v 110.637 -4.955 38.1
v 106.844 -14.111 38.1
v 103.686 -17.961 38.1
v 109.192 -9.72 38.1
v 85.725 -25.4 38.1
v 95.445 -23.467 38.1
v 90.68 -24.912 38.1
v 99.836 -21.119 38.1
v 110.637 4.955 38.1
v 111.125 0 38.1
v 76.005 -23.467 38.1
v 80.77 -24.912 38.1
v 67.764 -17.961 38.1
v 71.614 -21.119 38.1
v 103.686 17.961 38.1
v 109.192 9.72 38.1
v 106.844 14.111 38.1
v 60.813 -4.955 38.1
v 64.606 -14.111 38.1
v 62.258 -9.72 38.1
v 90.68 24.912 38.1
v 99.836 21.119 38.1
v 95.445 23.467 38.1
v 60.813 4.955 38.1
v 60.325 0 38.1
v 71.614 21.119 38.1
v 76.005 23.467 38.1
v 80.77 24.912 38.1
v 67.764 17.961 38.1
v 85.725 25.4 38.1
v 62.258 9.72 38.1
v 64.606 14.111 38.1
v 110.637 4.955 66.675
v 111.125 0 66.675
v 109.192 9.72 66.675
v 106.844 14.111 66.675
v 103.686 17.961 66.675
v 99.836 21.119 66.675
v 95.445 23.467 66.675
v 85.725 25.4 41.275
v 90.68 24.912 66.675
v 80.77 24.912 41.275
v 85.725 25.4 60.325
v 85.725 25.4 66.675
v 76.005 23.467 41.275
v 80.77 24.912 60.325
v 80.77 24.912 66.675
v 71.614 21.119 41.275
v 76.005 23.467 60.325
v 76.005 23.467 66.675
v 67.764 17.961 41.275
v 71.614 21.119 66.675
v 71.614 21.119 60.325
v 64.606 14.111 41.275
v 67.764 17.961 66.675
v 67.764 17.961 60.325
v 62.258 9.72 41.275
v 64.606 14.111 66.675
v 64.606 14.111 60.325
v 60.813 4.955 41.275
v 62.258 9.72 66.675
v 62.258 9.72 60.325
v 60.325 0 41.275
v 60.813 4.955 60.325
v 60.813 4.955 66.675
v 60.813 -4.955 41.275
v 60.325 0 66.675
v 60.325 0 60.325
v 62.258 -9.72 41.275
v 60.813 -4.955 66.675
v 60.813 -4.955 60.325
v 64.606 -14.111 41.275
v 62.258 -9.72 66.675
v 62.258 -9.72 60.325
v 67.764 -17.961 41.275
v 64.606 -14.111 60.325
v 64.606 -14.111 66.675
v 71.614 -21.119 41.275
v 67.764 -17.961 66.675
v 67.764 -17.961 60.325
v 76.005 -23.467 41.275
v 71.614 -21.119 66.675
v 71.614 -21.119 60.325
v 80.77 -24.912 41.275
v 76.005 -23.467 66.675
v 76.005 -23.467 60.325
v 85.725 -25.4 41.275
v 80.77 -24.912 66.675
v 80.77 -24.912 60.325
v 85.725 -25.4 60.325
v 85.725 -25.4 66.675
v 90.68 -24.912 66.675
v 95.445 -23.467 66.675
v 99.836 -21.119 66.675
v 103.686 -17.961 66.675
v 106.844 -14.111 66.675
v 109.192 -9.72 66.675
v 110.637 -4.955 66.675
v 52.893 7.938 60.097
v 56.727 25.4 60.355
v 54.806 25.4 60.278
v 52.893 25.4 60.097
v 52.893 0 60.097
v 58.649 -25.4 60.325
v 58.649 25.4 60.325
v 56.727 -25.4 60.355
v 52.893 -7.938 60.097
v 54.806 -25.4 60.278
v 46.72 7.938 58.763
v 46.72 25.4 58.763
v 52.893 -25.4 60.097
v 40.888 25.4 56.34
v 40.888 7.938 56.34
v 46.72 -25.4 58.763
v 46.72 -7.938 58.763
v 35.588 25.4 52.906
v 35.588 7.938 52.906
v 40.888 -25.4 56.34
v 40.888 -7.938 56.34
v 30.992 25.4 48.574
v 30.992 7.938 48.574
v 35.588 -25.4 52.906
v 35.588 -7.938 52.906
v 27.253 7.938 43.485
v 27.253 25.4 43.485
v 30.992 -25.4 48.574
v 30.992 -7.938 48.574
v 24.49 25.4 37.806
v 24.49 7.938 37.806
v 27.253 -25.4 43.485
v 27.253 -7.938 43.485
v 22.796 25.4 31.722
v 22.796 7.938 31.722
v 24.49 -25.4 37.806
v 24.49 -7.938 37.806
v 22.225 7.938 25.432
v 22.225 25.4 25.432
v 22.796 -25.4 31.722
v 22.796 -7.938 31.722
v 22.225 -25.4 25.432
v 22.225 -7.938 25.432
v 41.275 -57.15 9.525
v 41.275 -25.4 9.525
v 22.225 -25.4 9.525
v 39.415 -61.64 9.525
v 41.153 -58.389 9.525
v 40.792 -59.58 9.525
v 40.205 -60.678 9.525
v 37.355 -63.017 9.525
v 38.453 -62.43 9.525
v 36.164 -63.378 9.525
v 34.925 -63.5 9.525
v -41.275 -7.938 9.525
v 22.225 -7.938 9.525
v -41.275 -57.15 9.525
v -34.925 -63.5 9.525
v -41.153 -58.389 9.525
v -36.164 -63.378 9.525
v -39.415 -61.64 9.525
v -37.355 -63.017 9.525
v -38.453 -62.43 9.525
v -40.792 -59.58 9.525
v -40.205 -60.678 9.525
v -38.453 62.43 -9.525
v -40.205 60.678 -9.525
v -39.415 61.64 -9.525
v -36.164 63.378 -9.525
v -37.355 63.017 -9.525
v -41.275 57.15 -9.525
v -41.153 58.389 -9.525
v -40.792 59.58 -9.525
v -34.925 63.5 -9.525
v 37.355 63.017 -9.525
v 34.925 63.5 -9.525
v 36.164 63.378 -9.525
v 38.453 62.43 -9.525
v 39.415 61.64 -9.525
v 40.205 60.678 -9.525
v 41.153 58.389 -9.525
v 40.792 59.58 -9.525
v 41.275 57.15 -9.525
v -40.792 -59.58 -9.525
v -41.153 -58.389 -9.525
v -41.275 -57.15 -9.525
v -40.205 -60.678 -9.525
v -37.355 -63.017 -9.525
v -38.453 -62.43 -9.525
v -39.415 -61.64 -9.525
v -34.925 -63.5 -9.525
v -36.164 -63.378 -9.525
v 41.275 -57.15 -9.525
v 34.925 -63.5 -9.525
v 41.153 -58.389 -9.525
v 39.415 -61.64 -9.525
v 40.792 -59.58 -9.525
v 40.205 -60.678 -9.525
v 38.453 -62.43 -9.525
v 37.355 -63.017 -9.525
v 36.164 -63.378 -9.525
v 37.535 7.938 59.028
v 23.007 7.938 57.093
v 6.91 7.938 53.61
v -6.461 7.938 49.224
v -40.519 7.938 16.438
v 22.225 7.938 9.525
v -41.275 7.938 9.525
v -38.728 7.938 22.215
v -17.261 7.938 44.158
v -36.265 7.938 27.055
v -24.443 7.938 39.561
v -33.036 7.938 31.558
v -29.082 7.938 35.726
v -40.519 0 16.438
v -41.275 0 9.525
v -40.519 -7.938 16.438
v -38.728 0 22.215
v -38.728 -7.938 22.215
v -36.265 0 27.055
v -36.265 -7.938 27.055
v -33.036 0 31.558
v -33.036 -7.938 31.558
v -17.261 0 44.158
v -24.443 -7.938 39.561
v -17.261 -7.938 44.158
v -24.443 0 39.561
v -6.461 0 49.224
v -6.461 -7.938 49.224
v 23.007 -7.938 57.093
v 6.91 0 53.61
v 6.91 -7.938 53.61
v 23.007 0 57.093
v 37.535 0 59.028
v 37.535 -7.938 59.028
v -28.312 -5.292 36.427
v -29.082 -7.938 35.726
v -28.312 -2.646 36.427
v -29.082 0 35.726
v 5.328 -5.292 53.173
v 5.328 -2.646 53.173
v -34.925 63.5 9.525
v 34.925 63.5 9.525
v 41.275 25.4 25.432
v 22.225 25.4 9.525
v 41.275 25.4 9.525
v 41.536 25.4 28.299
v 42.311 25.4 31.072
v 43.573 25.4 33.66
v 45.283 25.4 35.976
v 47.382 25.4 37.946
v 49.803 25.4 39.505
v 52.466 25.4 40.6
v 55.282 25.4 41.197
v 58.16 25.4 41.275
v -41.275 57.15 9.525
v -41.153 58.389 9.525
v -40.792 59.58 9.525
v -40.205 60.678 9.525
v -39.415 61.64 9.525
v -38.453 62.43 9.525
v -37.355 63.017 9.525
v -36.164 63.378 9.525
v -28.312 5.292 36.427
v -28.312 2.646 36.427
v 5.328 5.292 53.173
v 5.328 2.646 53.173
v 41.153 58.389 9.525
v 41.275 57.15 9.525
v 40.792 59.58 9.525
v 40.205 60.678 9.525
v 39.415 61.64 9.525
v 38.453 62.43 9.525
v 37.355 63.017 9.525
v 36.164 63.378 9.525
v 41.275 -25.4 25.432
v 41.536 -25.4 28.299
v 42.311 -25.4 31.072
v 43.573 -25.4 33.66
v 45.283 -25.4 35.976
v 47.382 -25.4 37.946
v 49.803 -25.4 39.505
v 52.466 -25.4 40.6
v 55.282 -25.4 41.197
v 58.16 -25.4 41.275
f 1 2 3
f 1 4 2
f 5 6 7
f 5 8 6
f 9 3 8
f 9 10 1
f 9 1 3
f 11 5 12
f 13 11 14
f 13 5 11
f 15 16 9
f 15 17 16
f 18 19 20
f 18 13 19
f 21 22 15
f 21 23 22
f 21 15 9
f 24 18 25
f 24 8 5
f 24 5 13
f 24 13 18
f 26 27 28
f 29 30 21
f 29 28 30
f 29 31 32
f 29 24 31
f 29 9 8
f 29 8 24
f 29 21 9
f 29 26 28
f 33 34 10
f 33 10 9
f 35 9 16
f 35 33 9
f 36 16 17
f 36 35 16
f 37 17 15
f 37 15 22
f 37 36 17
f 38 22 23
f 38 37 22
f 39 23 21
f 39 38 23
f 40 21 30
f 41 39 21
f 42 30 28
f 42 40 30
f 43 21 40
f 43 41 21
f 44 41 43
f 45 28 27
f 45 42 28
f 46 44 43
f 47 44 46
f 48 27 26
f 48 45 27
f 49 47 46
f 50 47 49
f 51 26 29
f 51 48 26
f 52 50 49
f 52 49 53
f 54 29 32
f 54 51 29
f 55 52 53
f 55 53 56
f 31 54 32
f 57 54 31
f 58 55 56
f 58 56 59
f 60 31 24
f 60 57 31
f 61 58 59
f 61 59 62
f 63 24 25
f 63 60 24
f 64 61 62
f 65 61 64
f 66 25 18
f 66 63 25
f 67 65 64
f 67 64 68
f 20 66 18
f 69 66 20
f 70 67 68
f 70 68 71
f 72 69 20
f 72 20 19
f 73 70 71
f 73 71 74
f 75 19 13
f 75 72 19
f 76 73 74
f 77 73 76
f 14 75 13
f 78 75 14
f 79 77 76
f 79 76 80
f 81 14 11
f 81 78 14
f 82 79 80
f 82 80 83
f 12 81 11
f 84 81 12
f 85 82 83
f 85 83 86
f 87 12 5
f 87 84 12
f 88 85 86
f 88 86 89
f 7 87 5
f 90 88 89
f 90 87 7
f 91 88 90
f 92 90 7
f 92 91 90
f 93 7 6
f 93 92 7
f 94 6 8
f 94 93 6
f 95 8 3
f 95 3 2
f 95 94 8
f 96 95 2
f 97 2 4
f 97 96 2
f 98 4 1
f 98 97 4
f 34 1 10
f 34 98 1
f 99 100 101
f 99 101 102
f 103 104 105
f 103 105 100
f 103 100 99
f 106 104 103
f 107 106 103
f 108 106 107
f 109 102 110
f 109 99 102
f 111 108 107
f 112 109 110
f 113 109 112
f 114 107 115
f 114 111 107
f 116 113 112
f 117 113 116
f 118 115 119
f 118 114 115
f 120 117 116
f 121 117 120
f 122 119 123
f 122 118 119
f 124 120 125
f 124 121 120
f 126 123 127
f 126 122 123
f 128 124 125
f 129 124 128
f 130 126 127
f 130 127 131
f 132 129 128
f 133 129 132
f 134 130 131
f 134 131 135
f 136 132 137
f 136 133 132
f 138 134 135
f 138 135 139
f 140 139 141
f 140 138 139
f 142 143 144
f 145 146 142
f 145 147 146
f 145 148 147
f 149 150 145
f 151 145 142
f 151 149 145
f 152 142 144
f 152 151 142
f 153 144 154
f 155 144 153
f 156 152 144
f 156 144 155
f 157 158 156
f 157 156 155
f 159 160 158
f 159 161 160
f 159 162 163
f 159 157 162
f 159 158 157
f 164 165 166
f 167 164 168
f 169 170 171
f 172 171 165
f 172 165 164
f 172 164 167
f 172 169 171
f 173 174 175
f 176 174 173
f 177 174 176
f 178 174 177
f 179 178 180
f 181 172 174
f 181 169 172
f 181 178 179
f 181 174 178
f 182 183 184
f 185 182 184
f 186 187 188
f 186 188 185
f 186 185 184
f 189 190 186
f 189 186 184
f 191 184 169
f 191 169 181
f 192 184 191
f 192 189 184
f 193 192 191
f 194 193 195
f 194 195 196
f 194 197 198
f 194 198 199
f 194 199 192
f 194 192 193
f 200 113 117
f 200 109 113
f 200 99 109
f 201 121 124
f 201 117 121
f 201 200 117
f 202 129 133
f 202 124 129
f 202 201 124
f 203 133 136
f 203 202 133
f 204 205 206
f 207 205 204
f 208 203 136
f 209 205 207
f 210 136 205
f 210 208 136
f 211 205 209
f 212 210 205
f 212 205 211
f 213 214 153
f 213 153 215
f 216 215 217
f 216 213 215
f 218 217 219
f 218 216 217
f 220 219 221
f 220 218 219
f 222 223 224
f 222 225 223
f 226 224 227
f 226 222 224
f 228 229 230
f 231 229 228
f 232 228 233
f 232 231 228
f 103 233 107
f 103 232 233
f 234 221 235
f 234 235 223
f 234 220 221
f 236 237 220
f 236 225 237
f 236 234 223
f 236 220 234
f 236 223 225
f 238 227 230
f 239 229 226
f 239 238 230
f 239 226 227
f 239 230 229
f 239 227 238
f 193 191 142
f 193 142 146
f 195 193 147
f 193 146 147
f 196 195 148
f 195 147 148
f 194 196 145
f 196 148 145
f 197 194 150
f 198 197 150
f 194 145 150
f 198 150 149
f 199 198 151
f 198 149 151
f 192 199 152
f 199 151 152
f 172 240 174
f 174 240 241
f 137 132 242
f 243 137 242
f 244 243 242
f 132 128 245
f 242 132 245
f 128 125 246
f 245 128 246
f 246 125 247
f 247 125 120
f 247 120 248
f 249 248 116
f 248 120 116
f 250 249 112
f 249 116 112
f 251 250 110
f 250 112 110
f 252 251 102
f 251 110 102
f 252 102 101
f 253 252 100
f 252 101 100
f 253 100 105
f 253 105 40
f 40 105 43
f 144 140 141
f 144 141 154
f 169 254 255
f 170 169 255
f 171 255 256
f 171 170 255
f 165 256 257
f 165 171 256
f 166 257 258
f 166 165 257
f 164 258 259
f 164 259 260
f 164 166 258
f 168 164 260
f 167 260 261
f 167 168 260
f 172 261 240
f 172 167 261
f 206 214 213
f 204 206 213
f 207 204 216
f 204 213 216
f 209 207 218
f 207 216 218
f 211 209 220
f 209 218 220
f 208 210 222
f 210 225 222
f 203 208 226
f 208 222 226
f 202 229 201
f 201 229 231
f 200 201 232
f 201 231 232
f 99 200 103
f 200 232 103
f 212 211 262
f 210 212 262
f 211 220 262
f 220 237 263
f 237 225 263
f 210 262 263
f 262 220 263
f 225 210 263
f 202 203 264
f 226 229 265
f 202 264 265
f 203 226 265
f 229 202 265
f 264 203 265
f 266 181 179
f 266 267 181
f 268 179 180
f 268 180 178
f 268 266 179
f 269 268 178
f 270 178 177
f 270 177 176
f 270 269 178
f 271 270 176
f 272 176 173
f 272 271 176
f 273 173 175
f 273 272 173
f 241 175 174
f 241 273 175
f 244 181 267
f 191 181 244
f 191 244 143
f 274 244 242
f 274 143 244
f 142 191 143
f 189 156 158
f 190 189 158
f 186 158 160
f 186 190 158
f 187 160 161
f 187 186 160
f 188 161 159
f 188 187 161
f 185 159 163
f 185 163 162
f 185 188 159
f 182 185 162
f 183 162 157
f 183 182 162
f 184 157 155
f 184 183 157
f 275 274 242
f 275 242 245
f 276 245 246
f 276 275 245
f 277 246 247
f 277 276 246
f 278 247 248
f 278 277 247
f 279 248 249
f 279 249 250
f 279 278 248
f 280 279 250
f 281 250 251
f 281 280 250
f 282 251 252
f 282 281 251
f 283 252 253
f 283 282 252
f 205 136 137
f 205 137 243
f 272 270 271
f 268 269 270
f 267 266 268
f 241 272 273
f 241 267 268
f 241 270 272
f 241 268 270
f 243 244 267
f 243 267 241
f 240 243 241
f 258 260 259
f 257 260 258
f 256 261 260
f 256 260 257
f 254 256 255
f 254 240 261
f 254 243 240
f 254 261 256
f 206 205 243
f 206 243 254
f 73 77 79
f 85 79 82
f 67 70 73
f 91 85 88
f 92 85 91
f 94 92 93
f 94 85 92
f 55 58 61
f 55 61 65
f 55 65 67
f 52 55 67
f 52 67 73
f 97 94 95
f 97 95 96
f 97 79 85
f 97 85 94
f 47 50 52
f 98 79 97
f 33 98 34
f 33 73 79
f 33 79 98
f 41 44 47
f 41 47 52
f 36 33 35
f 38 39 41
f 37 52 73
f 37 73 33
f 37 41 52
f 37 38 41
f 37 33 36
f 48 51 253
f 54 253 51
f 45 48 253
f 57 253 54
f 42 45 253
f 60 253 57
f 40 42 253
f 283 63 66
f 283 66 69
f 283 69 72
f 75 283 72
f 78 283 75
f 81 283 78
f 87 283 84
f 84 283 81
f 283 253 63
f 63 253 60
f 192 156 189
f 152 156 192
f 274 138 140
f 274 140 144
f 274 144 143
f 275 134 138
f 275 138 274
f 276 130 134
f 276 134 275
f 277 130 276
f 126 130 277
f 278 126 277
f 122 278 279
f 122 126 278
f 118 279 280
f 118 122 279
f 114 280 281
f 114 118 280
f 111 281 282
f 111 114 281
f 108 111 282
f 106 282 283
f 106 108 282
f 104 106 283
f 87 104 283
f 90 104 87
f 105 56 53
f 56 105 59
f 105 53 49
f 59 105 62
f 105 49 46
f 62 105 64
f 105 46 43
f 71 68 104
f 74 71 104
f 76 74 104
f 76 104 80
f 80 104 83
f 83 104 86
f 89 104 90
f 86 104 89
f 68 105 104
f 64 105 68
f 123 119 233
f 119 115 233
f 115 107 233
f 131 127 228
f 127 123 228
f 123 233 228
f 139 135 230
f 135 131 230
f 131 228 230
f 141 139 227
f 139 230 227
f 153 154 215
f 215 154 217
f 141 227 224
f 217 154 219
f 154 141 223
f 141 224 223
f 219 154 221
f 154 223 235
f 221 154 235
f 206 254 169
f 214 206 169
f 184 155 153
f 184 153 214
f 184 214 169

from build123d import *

# Parameters (mm, degrees)
F1_DEPTH = 63.5
F2_DEPTH = 25.4
F3_DEPTH = 7.9375
F0_W     = 25.4
F0_H     = 19.0499985942
F4_DEPTH = 25.4
F6_R     = 6.35


with BuildPart() as f1:
    # F0 (on Front) → F1 (new body, symmetric)
    with BuildSketch(Plane.XZ):
        Polygon((-41.275, 9.525), (-41.275, -9.525), (41.275, -9.525), (41.275, 9.525), (22.2250014058, 9.525), align=None)
    extrude(amount=F1_DEPTH, both=True)

    # F0 (on Front) → F2 (join, symmetric)
    with BuildSketch(Plane.XZ):
        with BuildLine():
            Line((22.2250014058, 9.525), (41.275, 9.525))
            Line((41.275, 9.525), (41.275, 25.4321699366))
            ThreePointArc((41.275, 25.4321699366), (46.2876837818, 37.0091173484), (58.1601289922, 41.275))
            Line((58.1601289922, 41.275), (60.325, 41.275))
            Line((60.325, 41.275), (60.325, 60.3249985942))
            Line((60.325, 60.3249985942), (58.6486777751, 60.3249985942))
            ThreePointArc((58.6486777751, 60.3249985942), (55.7661237808, 60.3297402447), (52.8929969389, 60.0967549152))
            ThreePointArc((52.8929969389, 60.0967549152), (30.9924833678, 48.5739038915), (22.2250014058, 25.4321699366))
            Line((22.2250014058, 25.4321699366), (22.2250014058, 9.525))
        make_face()
    extrude(amount=F2_DEPTH, both=True)

    # F0 (on Front) → F3 (join, symmetric)
    with BuildSketch(Plane.XZ):
        with BuildLine():
            add(Edge.make_bspline(
                [(-41.275, 9.525), (-40.9022124169, 41.6161306688), (0.6165533939, 57.971909164), (52.8929969389, 60.0967549152)],
                knots=[0, 0, 0, 0, 108.2857694169, 108.2857694169, 108.2857694169, 108.2857694169], degree=3))
            Line((-41.275, 9.525), (22.2250014058, 9.525))
            Line((22.2250014058, 9.525), (22.2250014058, 25.4321699366))
            ThreePointArc((22.2250014058, 25.4321699366), (30.9924833678, 48.5739038915), (52.8929969389, 60.0967549152))
        make_face()
    extrude(amount=F3_DEPTH, both=True)

    # F0 (on Front) → F4 (join, symmetric)
    with BuildSketch(Plane.XZ):
        with Locations((73.025, 50.7999992971)):
            Rectangle(F0_W, F0_H)
    extrude(amount=F4_DEPTH, both=True)

    # F0 (on Front) → F5 (revolve)
    with BuildSketch(Plane.XZ):
        Polygon((85.725, 66.675), (85.725, 60.3249985942), (85.725, 41.275), (85.725, 38.1), (111.125, 38.1), (111.125, 66.675), align=None)
    revolve(axis=Axis((85.725, 0, 52.3875), (0, 0, 1)))

    # F6
    f6_edges = [f1.edges().sort_by_distance(p)[0] for p in [
        (-41.275, -63.5, 0),
        (41.275, -63.5, 0),
        (41.275, 63.5, 0),
        (-41.275, 63.5, 0),
    ]]
    fillet(f6_edges, radius=F6_R)


solid = f1.part
